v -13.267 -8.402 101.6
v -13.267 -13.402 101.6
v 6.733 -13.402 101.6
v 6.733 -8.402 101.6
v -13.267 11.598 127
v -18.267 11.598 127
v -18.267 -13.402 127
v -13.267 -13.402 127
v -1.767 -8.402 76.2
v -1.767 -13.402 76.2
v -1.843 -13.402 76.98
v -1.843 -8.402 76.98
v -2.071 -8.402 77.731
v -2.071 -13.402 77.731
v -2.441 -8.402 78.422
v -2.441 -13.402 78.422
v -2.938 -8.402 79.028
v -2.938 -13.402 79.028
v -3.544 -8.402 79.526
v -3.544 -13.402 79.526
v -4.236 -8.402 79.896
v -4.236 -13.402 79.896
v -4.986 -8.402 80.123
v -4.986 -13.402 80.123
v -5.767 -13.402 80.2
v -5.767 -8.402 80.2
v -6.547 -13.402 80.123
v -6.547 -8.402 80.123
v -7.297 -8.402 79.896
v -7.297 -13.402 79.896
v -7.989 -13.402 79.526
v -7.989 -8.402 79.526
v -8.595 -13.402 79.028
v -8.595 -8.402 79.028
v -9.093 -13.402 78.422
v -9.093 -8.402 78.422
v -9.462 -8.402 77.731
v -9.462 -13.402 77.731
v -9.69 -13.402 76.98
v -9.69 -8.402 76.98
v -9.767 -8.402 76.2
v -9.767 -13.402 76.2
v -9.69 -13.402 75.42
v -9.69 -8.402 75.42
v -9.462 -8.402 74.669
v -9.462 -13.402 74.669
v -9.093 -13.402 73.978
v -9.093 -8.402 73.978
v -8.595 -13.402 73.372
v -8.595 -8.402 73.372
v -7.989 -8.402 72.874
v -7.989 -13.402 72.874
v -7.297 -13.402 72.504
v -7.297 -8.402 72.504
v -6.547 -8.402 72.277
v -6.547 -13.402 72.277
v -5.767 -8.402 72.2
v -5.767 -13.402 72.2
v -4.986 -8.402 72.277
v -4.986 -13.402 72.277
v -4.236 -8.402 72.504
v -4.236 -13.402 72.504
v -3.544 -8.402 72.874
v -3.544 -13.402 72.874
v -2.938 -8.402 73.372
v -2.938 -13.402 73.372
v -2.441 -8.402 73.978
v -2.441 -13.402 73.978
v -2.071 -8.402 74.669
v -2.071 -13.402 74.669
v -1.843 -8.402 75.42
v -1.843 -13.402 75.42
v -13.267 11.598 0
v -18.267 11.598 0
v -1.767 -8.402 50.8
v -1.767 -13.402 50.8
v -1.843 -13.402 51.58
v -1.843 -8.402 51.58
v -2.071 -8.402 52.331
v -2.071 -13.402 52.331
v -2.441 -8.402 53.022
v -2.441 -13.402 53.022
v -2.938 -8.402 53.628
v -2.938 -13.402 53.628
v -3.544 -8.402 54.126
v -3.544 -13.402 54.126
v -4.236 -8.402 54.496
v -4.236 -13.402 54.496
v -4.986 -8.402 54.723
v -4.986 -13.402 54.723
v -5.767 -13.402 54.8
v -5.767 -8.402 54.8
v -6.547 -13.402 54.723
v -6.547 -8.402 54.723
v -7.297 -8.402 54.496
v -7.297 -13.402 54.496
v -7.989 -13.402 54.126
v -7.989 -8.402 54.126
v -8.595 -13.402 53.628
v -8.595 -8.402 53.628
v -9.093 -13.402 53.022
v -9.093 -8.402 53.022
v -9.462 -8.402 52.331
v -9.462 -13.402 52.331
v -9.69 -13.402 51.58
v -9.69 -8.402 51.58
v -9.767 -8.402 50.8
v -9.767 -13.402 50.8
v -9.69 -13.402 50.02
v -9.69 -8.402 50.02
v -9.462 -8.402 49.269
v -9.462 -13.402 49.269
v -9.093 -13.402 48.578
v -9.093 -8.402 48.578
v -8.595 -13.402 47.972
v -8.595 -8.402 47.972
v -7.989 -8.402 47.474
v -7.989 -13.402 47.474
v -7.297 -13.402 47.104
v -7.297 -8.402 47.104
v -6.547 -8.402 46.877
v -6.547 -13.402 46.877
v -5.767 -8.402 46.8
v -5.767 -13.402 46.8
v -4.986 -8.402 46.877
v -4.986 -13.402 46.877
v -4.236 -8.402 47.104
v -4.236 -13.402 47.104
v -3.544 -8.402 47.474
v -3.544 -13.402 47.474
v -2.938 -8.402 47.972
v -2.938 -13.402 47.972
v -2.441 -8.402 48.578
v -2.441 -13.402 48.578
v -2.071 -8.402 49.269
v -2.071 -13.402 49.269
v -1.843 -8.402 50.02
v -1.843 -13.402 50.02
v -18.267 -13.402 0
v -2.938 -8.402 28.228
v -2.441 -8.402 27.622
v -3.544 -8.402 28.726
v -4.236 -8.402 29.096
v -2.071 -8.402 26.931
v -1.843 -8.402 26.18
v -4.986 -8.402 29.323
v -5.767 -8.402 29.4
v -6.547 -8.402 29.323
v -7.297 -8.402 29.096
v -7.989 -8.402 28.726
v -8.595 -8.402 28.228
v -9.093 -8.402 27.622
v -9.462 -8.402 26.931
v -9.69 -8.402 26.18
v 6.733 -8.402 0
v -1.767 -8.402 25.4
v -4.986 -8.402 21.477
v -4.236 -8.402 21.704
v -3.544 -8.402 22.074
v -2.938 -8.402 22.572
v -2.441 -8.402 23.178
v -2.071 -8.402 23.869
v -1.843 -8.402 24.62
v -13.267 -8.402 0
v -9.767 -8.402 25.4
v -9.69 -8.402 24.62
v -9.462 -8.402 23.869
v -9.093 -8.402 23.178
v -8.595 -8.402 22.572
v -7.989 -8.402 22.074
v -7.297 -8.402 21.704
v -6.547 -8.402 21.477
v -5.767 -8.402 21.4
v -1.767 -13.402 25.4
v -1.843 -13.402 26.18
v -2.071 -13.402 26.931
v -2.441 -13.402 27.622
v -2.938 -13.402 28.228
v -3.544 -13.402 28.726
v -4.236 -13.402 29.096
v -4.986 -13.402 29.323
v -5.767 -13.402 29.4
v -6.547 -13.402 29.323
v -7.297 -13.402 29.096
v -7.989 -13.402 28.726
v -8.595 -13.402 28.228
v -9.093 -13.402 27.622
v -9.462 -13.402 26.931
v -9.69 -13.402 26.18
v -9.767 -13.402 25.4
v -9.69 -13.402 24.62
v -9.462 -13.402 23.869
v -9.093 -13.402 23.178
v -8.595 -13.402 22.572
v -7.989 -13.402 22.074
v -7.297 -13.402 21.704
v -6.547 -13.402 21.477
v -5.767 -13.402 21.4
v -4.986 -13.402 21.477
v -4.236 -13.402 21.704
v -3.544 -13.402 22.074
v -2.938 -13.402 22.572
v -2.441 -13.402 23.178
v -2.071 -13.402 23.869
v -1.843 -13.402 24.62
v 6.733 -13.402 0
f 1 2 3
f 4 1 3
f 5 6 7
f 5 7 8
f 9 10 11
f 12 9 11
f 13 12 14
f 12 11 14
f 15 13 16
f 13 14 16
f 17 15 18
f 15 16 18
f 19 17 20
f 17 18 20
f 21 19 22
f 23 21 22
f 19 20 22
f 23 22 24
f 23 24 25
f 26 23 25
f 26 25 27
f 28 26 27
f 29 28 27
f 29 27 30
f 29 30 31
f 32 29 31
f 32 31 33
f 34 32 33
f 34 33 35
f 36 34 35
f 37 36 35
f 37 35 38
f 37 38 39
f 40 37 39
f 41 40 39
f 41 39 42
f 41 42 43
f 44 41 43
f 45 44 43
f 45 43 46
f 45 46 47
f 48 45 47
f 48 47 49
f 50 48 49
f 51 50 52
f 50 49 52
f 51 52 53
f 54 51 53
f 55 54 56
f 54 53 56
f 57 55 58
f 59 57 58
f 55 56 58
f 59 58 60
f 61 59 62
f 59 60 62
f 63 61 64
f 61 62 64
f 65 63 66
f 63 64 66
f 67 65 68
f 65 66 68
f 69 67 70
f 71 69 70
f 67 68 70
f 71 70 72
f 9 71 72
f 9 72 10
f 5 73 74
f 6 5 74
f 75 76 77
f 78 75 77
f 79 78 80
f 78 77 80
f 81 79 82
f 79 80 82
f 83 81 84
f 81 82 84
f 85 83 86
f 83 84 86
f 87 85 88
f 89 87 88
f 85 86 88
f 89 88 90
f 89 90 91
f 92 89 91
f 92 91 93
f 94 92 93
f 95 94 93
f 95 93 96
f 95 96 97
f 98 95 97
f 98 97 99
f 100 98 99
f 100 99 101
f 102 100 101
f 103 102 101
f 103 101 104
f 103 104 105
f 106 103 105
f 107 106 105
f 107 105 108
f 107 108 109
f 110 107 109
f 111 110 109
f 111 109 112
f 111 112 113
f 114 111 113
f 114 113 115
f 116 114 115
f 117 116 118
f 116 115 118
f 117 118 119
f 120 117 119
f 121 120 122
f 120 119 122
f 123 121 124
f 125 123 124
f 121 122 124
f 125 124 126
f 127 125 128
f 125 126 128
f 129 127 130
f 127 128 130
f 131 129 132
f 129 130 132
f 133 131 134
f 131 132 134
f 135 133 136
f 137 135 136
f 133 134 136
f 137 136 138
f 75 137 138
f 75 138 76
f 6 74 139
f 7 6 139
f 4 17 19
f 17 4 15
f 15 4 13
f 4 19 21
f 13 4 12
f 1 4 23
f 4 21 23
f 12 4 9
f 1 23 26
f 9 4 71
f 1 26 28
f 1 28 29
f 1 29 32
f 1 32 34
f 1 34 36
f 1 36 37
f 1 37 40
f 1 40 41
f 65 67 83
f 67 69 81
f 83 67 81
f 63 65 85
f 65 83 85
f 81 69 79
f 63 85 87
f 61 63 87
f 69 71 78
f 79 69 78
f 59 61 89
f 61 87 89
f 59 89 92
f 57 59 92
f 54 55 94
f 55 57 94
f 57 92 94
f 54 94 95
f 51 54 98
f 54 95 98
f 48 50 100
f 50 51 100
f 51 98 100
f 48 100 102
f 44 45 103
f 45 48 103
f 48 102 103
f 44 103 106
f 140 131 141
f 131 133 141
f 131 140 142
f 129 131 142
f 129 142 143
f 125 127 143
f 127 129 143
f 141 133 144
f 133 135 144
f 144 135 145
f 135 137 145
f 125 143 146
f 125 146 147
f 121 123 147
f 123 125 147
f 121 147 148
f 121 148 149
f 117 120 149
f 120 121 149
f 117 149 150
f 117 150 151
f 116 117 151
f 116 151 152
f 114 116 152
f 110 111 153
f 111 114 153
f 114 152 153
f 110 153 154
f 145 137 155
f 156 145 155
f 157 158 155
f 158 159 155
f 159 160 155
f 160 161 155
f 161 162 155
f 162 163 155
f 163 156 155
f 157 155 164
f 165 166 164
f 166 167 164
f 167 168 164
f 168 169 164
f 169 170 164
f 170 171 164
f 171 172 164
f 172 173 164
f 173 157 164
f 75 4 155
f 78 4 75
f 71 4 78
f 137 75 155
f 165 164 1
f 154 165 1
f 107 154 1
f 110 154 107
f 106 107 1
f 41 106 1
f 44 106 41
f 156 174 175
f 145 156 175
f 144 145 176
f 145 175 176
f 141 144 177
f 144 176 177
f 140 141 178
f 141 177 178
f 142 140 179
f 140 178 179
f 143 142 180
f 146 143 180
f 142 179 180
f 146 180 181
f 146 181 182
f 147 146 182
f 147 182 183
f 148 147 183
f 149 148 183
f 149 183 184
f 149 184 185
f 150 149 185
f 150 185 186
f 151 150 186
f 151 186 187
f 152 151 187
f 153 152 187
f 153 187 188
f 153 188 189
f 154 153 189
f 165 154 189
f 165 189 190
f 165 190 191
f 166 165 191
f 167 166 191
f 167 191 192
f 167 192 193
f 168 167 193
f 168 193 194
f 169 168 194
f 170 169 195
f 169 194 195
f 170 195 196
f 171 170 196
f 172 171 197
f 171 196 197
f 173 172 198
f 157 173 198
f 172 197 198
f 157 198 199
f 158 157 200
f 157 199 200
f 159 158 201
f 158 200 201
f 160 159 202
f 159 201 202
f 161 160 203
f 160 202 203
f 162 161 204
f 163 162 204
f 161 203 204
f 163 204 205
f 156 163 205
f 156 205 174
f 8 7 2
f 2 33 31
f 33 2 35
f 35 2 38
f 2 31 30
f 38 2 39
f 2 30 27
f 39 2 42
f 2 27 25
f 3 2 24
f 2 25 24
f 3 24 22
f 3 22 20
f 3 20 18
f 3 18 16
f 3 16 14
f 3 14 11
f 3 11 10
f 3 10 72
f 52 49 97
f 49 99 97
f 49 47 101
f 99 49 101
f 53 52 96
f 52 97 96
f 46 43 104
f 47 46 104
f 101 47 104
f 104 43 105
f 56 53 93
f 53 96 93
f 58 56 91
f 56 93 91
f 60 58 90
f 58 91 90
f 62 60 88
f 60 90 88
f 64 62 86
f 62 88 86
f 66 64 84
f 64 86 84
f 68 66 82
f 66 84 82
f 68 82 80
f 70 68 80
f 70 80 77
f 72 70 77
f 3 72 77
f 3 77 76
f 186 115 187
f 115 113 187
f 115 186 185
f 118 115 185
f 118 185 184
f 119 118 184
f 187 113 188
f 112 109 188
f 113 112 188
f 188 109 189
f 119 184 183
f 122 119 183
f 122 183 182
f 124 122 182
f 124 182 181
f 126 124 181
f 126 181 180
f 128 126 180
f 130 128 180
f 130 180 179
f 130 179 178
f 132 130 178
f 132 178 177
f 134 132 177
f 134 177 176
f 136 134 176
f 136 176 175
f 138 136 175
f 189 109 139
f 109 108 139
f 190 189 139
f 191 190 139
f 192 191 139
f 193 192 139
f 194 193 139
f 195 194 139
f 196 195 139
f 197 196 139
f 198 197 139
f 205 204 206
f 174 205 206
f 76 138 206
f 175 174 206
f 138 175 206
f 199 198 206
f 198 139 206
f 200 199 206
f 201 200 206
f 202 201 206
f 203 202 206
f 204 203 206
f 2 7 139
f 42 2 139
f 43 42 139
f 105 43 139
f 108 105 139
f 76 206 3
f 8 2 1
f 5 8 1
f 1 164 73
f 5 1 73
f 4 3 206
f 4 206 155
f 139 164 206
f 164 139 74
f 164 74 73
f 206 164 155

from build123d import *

# Parameters (mm, degrees)
F1_DEPTH = 127
F2_R     = 4
F2_W     = 20
F2_H     = 25.4
F3_DEPTH = 25


with BuildPart() as f1:
    # F0 (on Top) → F1 (new body)
    with BuildSketch(Plane.XY):
        Polygon((-13.266638, 11.597826), (-18.266638, 11.597826), (-18.266638, -13.402174), (6.733362, -13.402174), (6.733362, -8.402174), (-13.266638, -8.402174), align=None)
    extrude(amount=F1_DEPTH)

    # F2 (on face) → F3 (cut)
    with BuildSketch(Plane.XZ.offset(13.402174)):
        with Locations((-5.766638, 76.2)):
            Circle(F2_R)
        with Locations((-5.766638, 50.8)):
            Circle(F2_R)
        with Locations((-5.766638, 25.4)):
            Circle(F2_R)
        with Locations((-3.266638, 114.3)):
            Rectangle(F2_W, F2_H)
    extrude(amount=-F3_DEPTH, mode=Mode.SUBTRACT)


solid = f1.part
